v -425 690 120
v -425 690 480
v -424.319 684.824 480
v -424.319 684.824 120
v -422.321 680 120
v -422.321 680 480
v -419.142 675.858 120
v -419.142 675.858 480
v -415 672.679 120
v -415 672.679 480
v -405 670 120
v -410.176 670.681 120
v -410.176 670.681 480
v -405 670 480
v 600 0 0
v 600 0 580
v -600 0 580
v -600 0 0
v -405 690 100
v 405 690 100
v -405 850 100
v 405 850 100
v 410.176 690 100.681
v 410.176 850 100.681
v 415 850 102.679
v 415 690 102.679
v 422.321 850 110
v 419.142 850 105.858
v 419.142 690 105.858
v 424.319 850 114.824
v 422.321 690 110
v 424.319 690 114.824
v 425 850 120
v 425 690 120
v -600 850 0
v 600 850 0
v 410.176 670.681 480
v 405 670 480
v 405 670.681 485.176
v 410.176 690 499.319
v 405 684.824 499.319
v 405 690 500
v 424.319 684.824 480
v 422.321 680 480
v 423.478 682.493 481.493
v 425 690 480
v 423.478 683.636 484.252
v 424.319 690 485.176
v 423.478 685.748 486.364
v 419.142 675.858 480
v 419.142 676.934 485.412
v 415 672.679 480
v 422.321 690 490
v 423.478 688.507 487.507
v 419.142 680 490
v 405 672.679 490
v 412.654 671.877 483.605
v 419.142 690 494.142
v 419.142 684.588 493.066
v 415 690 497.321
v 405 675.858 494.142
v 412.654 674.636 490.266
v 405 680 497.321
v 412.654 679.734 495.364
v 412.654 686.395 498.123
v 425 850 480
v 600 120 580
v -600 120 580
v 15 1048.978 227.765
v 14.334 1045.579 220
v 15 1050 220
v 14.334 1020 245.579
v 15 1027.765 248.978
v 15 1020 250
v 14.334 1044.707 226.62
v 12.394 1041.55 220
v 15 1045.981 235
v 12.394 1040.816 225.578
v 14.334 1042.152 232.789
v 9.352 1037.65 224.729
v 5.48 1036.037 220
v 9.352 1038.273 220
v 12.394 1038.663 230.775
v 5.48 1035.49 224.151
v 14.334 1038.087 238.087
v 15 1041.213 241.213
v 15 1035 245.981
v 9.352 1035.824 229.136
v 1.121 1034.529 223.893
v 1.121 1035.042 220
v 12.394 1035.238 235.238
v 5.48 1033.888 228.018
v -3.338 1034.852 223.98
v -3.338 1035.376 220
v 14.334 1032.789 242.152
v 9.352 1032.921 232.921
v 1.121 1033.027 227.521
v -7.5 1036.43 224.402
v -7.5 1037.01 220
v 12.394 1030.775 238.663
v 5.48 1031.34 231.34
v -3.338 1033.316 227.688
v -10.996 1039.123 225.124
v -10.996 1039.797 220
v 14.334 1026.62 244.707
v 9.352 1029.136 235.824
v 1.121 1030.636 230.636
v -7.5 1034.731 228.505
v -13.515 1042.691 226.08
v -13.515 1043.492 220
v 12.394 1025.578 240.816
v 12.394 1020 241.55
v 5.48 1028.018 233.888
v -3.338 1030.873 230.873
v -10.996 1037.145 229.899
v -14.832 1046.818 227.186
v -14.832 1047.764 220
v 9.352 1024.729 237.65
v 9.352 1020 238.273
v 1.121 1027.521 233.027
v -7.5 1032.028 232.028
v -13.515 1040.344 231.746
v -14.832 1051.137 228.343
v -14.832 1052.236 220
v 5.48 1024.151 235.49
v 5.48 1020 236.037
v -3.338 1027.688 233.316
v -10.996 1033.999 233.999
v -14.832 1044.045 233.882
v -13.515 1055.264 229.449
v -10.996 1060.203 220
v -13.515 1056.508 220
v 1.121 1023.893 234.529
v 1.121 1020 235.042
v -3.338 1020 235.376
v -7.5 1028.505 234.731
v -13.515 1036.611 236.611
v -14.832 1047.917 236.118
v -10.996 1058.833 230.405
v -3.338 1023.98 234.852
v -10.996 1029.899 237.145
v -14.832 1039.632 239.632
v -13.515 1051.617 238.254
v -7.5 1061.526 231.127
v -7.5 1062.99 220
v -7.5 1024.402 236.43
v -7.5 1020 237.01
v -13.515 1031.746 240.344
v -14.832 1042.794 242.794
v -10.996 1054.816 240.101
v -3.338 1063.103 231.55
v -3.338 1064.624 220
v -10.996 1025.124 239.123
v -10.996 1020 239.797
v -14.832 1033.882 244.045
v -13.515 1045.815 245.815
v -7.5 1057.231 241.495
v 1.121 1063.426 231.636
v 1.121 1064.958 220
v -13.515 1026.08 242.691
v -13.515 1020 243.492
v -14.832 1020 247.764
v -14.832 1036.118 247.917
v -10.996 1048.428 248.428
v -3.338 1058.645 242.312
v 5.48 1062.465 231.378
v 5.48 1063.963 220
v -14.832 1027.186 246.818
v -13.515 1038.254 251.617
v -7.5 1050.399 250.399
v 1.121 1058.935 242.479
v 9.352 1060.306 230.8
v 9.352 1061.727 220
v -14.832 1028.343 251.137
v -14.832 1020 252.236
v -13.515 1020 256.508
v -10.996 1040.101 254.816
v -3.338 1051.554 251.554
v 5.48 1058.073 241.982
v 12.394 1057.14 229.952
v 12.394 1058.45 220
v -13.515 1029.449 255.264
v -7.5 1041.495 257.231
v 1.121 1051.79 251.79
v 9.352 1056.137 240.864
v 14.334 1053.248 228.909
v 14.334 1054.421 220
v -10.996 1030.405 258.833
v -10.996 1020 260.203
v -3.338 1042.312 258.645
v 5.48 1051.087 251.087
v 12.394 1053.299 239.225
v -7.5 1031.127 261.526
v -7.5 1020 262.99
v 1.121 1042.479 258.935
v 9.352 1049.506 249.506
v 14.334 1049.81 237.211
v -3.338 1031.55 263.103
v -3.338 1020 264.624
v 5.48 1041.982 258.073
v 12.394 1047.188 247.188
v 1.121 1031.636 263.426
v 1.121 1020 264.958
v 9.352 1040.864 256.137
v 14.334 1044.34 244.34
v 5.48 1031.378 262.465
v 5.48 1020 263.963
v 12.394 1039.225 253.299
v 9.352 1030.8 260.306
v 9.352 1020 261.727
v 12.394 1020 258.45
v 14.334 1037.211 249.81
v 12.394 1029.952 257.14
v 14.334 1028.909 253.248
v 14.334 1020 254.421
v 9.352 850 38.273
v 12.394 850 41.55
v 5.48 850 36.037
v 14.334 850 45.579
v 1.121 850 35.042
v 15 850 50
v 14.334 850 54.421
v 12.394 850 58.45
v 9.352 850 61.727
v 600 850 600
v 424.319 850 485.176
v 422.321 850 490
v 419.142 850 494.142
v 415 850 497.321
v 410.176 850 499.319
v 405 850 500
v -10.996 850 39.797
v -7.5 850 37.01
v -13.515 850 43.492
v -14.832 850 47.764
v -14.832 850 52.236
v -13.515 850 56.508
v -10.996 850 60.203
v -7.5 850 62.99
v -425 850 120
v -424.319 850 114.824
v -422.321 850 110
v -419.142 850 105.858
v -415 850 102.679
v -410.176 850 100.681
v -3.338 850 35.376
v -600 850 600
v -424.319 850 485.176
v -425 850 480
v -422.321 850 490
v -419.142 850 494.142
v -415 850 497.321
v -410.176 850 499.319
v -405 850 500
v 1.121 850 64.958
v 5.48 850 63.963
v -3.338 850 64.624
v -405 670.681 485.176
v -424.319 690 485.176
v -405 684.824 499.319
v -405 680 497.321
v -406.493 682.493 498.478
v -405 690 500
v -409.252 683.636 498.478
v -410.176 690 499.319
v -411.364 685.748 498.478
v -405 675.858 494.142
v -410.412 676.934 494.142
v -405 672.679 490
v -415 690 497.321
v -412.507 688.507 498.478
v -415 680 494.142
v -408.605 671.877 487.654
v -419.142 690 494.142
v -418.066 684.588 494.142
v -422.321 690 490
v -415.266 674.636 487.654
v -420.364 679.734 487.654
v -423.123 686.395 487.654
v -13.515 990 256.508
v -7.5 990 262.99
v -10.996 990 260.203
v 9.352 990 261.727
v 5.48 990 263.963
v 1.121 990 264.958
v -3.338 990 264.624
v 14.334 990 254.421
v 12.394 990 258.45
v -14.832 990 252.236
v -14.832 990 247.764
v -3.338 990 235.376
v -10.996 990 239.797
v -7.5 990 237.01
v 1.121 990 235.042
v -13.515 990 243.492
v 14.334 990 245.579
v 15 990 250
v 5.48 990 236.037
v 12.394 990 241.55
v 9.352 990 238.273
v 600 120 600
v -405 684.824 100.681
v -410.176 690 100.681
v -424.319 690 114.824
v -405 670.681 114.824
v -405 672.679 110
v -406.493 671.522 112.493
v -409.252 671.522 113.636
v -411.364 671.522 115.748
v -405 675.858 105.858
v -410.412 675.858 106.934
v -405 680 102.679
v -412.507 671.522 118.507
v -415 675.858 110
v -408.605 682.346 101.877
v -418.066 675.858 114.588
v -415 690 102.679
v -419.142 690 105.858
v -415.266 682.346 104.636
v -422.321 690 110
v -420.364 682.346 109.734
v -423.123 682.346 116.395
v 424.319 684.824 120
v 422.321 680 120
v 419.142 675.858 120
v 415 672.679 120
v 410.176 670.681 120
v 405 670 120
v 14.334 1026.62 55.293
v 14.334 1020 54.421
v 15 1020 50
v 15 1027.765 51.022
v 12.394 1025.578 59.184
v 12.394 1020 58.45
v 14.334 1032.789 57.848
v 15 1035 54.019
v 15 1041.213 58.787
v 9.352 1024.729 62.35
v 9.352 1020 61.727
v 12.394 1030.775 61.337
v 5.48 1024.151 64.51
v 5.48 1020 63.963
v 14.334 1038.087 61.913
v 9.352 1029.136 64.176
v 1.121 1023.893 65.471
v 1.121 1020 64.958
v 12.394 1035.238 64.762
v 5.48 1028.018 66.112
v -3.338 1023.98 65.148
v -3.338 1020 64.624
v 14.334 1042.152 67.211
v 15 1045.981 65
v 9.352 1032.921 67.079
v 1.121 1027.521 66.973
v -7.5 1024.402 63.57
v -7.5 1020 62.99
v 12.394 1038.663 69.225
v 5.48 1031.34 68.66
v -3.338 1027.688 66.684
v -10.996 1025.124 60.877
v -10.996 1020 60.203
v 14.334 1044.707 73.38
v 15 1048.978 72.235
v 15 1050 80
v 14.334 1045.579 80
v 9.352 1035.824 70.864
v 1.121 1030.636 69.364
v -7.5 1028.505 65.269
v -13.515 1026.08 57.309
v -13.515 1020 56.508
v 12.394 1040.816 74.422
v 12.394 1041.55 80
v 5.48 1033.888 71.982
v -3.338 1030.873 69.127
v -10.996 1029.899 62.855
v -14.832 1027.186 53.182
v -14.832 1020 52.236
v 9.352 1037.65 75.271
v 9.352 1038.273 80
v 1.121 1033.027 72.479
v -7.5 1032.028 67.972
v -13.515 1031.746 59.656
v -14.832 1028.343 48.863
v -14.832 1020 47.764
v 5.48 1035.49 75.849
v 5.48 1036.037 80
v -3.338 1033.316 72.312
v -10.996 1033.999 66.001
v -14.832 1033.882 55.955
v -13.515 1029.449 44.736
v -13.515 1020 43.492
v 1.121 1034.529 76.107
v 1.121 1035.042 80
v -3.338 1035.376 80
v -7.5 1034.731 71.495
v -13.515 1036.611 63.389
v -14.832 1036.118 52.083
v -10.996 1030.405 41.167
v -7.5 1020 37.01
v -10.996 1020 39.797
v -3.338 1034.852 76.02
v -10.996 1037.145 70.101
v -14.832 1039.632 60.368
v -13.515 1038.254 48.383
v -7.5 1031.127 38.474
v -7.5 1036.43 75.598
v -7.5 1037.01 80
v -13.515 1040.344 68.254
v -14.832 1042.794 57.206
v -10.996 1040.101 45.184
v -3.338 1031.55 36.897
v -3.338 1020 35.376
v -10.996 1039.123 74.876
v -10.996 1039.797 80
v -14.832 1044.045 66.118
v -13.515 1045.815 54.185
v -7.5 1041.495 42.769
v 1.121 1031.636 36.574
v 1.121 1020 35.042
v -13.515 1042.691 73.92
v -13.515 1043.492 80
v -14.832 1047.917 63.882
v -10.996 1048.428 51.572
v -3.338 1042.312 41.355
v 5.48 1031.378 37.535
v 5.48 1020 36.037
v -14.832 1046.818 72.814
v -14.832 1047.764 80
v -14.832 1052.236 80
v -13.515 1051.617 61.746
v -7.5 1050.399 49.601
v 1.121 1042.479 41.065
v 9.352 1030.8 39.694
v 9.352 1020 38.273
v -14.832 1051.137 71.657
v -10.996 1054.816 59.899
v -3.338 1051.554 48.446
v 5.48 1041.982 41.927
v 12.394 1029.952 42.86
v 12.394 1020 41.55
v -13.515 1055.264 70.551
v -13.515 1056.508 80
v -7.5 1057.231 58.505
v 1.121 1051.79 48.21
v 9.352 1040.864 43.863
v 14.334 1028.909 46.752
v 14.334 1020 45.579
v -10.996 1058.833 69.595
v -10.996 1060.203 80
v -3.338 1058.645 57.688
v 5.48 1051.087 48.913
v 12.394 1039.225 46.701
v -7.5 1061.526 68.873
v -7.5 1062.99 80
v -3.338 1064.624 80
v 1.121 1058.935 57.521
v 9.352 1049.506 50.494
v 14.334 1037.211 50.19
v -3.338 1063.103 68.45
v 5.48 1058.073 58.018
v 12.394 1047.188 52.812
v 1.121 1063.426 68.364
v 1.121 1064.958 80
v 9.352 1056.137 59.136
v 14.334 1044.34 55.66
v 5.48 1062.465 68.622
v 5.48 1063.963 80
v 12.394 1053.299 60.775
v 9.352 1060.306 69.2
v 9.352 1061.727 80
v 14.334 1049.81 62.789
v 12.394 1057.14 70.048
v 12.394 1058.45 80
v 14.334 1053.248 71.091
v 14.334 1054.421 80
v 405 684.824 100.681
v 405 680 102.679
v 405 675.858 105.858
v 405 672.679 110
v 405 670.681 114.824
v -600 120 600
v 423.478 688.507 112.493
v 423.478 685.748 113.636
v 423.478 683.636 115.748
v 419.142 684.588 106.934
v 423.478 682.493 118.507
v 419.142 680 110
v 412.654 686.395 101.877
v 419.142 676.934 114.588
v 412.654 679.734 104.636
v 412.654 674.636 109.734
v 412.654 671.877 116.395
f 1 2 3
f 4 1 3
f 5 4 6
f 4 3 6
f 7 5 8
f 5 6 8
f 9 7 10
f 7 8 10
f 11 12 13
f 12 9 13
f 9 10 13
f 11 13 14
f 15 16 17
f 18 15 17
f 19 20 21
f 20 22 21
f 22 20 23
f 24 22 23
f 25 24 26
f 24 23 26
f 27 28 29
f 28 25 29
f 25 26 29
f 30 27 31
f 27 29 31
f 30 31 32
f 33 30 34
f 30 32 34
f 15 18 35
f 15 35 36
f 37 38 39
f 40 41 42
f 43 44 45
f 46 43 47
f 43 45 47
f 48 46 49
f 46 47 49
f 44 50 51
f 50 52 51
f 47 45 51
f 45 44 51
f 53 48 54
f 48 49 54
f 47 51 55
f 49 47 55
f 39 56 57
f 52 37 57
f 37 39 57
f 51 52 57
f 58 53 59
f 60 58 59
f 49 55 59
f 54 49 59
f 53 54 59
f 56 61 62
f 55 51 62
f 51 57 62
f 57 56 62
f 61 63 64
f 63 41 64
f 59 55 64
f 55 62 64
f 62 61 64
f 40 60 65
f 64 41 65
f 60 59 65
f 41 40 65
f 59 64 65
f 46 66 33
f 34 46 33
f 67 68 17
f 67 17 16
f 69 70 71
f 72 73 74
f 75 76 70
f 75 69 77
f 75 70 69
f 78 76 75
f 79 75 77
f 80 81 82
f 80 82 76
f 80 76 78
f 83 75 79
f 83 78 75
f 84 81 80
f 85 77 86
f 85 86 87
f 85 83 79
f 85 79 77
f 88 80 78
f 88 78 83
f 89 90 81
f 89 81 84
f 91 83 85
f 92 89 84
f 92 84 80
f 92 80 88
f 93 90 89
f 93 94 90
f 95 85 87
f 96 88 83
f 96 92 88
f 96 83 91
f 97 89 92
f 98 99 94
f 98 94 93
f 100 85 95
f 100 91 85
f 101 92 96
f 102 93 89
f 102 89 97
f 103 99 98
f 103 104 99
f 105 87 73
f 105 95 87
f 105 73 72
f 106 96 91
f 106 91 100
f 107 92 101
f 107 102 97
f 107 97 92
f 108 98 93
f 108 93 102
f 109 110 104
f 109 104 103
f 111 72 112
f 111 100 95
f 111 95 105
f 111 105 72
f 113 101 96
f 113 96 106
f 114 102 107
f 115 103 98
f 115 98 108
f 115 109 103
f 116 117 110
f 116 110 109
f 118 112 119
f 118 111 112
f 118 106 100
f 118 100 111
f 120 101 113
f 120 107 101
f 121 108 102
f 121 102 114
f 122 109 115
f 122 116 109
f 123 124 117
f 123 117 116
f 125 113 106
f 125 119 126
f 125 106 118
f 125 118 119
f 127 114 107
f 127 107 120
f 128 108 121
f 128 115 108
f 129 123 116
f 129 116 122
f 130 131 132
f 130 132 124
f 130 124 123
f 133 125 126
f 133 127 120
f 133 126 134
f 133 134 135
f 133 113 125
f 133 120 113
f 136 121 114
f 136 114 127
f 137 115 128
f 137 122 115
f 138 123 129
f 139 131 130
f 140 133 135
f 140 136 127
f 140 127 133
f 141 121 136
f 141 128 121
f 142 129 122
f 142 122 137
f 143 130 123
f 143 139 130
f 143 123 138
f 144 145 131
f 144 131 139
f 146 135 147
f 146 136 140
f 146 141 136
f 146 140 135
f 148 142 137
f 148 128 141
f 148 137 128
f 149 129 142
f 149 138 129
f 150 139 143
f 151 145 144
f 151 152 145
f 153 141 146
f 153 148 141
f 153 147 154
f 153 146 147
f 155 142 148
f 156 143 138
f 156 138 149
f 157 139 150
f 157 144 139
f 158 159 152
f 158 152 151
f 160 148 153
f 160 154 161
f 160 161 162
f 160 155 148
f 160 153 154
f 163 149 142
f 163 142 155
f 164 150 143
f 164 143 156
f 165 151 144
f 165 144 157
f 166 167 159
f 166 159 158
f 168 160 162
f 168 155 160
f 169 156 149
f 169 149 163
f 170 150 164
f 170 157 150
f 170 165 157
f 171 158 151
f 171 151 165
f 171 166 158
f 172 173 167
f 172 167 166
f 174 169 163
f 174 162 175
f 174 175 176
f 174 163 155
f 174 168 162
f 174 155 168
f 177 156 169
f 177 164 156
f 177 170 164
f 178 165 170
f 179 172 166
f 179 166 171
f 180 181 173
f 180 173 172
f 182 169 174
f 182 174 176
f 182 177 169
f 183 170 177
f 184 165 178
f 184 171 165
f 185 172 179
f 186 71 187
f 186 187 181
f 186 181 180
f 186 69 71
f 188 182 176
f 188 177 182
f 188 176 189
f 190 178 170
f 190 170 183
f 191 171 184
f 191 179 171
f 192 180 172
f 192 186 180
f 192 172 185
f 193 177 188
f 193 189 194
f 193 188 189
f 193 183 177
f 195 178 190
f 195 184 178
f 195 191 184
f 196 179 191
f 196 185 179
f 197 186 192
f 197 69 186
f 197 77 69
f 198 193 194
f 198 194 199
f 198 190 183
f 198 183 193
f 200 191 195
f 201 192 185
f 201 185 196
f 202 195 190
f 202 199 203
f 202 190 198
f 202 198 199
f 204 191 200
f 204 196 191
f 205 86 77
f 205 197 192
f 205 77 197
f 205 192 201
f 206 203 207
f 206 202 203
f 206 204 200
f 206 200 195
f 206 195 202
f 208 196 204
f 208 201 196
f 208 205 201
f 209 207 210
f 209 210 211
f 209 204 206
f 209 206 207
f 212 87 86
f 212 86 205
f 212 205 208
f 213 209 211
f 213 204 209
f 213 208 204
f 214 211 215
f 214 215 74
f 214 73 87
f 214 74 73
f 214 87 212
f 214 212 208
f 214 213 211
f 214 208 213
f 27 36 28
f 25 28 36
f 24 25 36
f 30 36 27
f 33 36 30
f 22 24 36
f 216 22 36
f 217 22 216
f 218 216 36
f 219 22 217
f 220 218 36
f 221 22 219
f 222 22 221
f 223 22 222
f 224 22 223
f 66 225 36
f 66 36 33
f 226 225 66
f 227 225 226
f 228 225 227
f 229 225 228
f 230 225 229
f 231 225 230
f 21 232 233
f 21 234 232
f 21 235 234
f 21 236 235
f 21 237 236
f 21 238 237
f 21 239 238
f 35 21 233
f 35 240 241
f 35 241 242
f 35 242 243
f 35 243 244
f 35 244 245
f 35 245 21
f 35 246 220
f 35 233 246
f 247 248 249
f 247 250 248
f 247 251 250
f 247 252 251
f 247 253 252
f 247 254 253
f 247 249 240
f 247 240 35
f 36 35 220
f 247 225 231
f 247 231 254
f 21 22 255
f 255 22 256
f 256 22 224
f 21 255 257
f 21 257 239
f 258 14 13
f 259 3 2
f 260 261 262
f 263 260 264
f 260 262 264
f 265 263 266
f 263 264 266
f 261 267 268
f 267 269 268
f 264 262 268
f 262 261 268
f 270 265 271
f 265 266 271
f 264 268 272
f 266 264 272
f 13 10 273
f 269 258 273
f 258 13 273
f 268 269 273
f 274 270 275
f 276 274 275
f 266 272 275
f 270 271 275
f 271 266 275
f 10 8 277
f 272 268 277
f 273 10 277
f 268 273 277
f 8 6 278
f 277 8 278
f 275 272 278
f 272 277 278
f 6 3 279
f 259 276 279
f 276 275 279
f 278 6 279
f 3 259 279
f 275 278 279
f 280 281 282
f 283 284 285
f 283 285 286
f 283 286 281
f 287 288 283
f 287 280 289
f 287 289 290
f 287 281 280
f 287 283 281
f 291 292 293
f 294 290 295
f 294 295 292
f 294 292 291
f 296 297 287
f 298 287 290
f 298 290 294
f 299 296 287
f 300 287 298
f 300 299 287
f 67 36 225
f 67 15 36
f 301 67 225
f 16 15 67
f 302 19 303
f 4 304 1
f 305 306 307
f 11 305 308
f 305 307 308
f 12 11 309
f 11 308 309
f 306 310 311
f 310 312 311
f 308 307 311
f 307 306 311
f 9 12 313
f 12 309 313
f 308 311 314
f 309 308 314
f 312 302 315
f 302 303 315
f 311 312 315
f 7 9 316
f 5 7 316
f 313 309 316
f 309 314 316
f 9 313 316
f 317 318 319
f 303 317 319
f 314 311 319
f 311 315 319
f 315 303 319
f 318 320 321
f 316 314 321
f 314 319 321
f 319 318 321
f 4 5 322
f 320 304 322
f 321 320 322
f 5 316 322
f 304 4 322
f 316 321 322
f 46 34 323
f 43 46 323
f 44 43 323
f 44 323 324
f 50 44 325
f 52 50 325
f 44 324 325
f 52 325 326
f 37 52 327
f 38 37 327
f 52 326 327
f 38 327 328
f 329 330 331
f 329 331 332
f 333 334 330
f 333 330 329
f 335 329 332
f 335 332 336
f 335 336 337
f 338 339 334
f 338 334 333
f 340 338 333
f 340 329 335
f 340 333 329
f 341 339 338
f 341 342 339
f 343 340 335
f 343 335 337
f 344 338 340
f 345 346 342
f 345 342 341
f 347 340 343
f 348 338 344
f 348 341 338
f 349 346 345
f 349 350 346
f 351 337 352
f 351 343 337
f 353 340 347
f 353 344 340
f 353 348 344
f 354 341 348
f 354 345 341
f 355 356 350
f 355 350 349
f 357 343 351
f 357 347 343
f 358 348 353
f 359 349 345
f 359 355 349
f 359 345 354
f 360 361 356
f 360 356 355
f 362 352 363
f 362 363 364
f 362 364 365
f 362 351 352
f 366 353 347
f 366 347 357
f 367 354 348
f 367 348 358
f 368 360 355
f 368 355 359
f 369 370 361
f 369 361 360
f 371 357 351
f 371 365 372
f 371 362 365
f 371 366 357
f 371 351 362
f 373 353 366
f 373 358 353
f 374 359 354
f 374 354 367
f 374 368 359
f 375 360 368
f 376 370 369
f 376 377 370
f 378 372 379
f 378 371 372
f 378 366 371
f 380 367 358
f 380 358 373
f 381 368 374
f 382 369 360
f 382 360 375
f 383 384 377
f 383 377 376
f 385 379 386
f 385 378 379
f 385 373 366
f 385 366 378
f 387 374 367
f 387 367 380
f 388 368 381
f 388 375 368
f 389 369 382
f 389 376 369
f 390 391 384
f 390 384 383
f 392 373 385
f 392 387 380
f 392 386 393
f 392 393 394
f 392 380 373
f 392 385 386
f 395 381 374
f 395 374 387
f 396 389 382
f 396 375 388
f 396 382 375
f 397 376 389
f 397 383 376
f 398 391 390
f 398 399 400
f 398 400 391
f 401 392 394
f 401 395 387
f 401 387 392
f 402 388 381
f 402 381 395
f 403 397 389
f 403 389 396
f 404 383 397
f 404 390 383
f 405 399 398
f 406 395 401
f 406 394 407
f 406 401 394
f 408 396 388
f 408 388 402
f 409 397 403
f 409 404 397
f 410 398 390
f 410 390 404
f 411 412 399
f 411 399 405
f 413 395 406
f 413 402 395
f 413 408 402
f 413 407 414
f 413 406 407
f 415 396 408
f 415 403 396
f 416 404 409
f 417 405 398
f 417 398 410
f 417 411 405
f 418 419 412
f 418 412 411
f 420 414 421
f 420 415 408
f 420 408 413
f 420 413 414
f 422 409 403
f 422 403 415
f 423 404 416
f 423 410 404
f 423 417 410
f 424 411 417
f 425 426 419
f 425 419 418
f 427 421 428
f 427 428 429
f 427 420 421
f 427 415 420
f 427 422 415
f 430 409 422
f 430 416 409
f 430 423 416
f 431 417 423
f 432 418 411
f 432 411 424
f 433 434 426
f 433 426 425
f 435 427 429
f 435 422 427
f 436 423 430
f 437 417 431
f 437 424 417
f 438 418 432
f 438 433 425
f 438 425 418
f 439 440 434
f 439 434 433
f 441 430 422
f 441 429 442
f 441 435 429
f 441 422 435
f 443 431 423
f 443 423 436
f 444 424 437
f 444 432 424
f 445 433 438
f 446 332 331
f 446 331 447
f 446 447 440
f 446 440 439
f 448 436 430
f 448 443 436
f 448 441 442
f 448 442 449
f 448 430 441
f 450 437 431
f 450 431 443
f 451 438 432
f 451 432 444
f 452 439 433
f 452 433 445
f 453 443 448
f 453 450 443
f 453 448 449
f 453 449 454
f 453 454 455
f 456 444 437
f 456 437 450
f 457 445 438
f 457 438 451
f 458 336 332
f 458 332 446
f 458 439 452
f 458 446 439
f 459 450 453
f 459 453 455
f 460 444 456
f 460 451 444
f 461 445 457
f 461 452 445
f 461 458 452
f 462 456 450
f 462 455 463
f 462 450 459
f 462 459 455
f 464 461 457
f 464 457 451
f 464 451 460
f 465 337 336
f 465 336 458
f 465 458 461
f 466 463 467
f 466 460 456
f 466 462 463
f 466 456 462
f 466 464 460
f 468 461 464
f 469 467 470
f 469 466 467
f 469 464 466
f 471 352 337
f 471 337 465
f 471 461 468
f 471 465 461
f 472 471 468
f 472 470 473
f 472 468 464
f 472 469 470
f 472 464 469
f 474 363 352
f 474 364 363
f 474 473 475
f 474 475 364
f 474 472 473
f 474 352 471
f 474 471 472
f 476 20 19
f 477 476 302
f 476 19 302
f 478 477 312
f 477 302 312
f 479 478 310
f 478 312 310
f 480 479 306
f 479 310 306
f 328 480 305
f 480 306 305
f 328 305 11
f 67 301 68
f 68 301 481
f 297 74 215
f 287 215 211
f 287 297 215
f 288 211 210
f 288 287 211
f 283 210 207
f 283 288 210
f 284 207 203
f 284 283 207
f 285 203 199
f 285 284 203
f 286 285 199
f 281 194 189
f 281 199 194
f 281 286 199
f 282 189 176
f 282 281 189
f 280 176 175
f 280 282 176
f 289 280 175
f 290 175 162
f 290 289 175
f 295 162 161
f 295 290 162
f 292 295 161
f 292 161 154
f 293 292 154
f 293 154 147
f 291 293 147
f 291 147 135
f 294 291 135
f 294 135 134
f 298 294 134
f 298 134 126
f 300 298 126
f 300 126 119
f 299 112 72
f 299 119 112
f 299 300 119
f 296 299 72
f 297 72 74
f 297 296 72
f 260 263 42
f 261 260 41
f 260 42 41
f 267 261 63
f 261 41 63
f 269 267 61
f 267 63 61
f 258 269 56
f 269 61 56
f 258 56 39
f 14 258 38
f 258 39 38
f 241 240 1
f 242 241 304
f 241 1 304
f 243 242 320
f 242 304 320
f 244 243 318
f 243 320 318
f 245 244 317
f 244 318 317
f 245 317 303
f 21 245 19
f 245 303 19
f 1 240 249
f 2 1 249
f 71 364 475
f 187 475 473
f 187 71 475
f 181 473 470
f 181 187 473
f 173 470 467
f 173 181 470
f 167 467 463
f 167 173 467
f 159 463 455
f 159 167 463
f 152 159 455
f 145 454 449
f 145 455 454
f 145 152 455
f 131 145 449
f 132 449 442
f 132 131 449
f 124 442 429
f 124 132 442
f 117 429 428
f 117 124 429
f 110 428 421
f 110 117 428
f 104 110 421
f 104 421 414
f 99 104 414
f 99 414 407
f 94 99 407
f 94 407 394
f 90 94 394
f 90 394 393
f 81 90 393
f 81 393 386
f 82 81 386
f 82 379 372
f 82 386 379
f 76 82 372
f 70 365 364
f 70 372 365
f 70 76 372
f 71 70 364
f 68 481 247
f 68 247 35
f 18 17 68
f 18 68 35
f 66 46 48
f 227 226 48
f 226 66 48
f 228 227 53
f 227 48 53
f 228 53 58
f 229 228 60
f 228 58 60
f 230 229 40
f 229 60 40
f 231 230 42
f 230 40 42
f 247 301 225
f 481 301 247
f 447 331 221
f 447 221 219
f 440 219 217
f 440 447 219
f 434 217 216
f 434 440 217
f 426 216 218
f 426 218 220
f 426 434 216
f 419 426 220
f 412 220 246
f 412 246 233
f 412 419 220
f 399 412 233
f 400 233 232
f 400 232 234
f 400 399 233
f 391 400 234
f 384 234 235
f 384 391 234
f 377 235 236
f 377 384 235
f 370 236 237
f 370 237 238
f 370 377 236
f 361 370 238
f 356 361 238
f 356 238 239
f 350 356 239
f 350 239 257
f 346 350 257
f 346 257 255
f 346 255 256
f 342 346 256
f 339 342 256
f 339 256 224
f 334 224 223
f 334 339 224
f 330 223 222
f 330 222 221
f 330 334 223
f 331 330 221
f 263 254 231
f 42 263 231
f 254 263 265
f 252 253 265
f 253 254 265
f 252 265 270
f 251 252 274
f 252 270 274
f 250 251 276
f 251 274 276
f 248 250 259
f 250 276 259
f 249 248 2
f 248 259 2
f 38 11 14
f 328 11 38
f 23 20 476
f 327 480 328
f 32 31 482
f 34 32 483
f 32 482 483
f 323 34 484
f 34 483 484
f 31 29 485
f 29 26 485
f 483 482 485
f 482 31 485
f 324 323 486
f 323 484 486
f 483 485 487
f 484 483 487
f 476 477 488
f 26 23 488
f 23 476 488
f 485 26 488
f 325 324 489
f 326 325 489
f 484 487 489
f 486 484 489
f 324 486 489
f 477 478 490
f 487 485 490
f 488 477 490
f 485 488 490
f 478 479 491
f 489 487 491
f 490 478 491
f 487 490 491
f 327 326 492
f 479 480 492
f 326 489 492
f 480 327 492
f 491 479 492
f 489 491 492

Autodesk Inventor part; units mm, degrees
ref_plane "YZ Plane" through (0, 0, 0) normal (1, 0, 0) x (0, 1, 0)
ref_plane "XZ Plane" through (0, 0, 0) normal (0, 1, 0) x (-1, 0, 0)
ref_plane "XY Plane" through (0, 0, 0) normal (0, 0, 1) x (1, 0, 0)
sketch "Sketch1" plane through (0, 0, 0) normal (0, 1, 0) x (-1, 0, 0)
  line L0 (600, 0) -> (-600, 0)
  line L1 (-600, 0) -> (-600, 600)
  line L2 (-600, 600) -> (600, 600)
  line L3 (600, 600) -> (600, 0)
  point P0 (0, 0)
  point P1 (0, 0)
  dimension "d0" = 1200
  dimension "d1" = 600
extrude "Extrusion1" add sketch "Sketch1" along normal blind 850
sketch "Sketch2" plane through (0, 850, 0) normal (0, 1, 0) x (1, 0, 0)
  line L0 (-425, -500) -> (425, -500)
  line L1 (425, -500) -> (425, -100)
  line L2 (425, -100) -> (-425, -100)
  line L3 (-425, -100) -> (-425, -500)
  line L4 (-425, -500) -> (425, -100) construction
  line L5 (425, -500) -> (-425, -100) construction
  line L6 (-600, 0) -> (-600, -600) projected
  line L7 (-600, -600) -> (600, -600) projected
  point P0 (0, 0)
  point P1 (0, -300)
  point P2 (-600, -300)
  point P3 (-600, -300)
  point P4 (0, -600)
  dimension "d4" = 850
  dimension "d5" = 400
extrude "Extrusion2" cut sketch "Sketch2" against normal blind 180
fillet "Fillet1" radius 20 8 edges at (-425, 760, 100) (-425, 670, 300) (0, 670, 100) (-425, 760, 500) (0, 670, 500) (425, 670, 300) (425, 760, 500) (425, 760, 100)
sketch "Sketch3" plane through (-600, 0, 600) normal (0, 0, 1) x (1, 0, 0)
  line L0 (0, 0) -> (1200, 0) projected
  line L1 (1200, 0) -> (1200, 850) projected
  line L2 (0, 0) -> (1200, 0)
  line L3 (1200, 0) -> (1200, 120)
  line L4 (1200, 120) -> (0, 120)
  line L5 (0, 120) -> (0, 0)
  point P0 (600, 0)
  dimension "d9" = 120
extrude "Extrusion3" cut sketch "Sketch3" against normal blind 20
sketch "Sketch4" plane through (0, 0, 0) normal (1, 0, 0) x (0, 1, 0)
  line L0 (850, 120) -> (850, 100) projected
  line L1 (850, 120) -> (850, 480) projected
  line L2 (850, 500) -> (850, 480) projected
  line L3 (850, 480) -> (850, 500) projected
  line L4 (850, 480) -> (850, 120) projected
  line L5 (850, 100) -> (850, 120) projected
  line L6 (850, 600) -> (850, 0) projected
  line L7 (850, 0) -> (850, 600) projected
  line L8 (850, 50) -> (1020, 50)
  arc A0 (1020, 50) -> (1050, 80) centre (1020, 80) ccw
  line L9 (1050, 80) -> (1050, 220)
  arc A1 (1050, 220) -> (1020, 250) centre (1020, 220) ccw
  line L10 (1020, 250) -> (990, 250)
  point P0 (0, 0)
  dimension "d12" = 60
  dimension "d13" = 200
  dimension "d14" = 50
  dimension "d15" = 200
  dimension "d16" = 30
sketch "Sketch5" plane through (0, 850, 0) normal (0, 1, 0) x (1, 0, 0)
  circle A0 centre (0, -50) radius 15
  point P0 (0, 0)
  dimension "d17" = 30
sweep "Sweep1" add profiles "Sketch5" path "Sketch4" path curves L8 A0 L9 A1 L10
properties part number "Mobile lavandino 1200"
